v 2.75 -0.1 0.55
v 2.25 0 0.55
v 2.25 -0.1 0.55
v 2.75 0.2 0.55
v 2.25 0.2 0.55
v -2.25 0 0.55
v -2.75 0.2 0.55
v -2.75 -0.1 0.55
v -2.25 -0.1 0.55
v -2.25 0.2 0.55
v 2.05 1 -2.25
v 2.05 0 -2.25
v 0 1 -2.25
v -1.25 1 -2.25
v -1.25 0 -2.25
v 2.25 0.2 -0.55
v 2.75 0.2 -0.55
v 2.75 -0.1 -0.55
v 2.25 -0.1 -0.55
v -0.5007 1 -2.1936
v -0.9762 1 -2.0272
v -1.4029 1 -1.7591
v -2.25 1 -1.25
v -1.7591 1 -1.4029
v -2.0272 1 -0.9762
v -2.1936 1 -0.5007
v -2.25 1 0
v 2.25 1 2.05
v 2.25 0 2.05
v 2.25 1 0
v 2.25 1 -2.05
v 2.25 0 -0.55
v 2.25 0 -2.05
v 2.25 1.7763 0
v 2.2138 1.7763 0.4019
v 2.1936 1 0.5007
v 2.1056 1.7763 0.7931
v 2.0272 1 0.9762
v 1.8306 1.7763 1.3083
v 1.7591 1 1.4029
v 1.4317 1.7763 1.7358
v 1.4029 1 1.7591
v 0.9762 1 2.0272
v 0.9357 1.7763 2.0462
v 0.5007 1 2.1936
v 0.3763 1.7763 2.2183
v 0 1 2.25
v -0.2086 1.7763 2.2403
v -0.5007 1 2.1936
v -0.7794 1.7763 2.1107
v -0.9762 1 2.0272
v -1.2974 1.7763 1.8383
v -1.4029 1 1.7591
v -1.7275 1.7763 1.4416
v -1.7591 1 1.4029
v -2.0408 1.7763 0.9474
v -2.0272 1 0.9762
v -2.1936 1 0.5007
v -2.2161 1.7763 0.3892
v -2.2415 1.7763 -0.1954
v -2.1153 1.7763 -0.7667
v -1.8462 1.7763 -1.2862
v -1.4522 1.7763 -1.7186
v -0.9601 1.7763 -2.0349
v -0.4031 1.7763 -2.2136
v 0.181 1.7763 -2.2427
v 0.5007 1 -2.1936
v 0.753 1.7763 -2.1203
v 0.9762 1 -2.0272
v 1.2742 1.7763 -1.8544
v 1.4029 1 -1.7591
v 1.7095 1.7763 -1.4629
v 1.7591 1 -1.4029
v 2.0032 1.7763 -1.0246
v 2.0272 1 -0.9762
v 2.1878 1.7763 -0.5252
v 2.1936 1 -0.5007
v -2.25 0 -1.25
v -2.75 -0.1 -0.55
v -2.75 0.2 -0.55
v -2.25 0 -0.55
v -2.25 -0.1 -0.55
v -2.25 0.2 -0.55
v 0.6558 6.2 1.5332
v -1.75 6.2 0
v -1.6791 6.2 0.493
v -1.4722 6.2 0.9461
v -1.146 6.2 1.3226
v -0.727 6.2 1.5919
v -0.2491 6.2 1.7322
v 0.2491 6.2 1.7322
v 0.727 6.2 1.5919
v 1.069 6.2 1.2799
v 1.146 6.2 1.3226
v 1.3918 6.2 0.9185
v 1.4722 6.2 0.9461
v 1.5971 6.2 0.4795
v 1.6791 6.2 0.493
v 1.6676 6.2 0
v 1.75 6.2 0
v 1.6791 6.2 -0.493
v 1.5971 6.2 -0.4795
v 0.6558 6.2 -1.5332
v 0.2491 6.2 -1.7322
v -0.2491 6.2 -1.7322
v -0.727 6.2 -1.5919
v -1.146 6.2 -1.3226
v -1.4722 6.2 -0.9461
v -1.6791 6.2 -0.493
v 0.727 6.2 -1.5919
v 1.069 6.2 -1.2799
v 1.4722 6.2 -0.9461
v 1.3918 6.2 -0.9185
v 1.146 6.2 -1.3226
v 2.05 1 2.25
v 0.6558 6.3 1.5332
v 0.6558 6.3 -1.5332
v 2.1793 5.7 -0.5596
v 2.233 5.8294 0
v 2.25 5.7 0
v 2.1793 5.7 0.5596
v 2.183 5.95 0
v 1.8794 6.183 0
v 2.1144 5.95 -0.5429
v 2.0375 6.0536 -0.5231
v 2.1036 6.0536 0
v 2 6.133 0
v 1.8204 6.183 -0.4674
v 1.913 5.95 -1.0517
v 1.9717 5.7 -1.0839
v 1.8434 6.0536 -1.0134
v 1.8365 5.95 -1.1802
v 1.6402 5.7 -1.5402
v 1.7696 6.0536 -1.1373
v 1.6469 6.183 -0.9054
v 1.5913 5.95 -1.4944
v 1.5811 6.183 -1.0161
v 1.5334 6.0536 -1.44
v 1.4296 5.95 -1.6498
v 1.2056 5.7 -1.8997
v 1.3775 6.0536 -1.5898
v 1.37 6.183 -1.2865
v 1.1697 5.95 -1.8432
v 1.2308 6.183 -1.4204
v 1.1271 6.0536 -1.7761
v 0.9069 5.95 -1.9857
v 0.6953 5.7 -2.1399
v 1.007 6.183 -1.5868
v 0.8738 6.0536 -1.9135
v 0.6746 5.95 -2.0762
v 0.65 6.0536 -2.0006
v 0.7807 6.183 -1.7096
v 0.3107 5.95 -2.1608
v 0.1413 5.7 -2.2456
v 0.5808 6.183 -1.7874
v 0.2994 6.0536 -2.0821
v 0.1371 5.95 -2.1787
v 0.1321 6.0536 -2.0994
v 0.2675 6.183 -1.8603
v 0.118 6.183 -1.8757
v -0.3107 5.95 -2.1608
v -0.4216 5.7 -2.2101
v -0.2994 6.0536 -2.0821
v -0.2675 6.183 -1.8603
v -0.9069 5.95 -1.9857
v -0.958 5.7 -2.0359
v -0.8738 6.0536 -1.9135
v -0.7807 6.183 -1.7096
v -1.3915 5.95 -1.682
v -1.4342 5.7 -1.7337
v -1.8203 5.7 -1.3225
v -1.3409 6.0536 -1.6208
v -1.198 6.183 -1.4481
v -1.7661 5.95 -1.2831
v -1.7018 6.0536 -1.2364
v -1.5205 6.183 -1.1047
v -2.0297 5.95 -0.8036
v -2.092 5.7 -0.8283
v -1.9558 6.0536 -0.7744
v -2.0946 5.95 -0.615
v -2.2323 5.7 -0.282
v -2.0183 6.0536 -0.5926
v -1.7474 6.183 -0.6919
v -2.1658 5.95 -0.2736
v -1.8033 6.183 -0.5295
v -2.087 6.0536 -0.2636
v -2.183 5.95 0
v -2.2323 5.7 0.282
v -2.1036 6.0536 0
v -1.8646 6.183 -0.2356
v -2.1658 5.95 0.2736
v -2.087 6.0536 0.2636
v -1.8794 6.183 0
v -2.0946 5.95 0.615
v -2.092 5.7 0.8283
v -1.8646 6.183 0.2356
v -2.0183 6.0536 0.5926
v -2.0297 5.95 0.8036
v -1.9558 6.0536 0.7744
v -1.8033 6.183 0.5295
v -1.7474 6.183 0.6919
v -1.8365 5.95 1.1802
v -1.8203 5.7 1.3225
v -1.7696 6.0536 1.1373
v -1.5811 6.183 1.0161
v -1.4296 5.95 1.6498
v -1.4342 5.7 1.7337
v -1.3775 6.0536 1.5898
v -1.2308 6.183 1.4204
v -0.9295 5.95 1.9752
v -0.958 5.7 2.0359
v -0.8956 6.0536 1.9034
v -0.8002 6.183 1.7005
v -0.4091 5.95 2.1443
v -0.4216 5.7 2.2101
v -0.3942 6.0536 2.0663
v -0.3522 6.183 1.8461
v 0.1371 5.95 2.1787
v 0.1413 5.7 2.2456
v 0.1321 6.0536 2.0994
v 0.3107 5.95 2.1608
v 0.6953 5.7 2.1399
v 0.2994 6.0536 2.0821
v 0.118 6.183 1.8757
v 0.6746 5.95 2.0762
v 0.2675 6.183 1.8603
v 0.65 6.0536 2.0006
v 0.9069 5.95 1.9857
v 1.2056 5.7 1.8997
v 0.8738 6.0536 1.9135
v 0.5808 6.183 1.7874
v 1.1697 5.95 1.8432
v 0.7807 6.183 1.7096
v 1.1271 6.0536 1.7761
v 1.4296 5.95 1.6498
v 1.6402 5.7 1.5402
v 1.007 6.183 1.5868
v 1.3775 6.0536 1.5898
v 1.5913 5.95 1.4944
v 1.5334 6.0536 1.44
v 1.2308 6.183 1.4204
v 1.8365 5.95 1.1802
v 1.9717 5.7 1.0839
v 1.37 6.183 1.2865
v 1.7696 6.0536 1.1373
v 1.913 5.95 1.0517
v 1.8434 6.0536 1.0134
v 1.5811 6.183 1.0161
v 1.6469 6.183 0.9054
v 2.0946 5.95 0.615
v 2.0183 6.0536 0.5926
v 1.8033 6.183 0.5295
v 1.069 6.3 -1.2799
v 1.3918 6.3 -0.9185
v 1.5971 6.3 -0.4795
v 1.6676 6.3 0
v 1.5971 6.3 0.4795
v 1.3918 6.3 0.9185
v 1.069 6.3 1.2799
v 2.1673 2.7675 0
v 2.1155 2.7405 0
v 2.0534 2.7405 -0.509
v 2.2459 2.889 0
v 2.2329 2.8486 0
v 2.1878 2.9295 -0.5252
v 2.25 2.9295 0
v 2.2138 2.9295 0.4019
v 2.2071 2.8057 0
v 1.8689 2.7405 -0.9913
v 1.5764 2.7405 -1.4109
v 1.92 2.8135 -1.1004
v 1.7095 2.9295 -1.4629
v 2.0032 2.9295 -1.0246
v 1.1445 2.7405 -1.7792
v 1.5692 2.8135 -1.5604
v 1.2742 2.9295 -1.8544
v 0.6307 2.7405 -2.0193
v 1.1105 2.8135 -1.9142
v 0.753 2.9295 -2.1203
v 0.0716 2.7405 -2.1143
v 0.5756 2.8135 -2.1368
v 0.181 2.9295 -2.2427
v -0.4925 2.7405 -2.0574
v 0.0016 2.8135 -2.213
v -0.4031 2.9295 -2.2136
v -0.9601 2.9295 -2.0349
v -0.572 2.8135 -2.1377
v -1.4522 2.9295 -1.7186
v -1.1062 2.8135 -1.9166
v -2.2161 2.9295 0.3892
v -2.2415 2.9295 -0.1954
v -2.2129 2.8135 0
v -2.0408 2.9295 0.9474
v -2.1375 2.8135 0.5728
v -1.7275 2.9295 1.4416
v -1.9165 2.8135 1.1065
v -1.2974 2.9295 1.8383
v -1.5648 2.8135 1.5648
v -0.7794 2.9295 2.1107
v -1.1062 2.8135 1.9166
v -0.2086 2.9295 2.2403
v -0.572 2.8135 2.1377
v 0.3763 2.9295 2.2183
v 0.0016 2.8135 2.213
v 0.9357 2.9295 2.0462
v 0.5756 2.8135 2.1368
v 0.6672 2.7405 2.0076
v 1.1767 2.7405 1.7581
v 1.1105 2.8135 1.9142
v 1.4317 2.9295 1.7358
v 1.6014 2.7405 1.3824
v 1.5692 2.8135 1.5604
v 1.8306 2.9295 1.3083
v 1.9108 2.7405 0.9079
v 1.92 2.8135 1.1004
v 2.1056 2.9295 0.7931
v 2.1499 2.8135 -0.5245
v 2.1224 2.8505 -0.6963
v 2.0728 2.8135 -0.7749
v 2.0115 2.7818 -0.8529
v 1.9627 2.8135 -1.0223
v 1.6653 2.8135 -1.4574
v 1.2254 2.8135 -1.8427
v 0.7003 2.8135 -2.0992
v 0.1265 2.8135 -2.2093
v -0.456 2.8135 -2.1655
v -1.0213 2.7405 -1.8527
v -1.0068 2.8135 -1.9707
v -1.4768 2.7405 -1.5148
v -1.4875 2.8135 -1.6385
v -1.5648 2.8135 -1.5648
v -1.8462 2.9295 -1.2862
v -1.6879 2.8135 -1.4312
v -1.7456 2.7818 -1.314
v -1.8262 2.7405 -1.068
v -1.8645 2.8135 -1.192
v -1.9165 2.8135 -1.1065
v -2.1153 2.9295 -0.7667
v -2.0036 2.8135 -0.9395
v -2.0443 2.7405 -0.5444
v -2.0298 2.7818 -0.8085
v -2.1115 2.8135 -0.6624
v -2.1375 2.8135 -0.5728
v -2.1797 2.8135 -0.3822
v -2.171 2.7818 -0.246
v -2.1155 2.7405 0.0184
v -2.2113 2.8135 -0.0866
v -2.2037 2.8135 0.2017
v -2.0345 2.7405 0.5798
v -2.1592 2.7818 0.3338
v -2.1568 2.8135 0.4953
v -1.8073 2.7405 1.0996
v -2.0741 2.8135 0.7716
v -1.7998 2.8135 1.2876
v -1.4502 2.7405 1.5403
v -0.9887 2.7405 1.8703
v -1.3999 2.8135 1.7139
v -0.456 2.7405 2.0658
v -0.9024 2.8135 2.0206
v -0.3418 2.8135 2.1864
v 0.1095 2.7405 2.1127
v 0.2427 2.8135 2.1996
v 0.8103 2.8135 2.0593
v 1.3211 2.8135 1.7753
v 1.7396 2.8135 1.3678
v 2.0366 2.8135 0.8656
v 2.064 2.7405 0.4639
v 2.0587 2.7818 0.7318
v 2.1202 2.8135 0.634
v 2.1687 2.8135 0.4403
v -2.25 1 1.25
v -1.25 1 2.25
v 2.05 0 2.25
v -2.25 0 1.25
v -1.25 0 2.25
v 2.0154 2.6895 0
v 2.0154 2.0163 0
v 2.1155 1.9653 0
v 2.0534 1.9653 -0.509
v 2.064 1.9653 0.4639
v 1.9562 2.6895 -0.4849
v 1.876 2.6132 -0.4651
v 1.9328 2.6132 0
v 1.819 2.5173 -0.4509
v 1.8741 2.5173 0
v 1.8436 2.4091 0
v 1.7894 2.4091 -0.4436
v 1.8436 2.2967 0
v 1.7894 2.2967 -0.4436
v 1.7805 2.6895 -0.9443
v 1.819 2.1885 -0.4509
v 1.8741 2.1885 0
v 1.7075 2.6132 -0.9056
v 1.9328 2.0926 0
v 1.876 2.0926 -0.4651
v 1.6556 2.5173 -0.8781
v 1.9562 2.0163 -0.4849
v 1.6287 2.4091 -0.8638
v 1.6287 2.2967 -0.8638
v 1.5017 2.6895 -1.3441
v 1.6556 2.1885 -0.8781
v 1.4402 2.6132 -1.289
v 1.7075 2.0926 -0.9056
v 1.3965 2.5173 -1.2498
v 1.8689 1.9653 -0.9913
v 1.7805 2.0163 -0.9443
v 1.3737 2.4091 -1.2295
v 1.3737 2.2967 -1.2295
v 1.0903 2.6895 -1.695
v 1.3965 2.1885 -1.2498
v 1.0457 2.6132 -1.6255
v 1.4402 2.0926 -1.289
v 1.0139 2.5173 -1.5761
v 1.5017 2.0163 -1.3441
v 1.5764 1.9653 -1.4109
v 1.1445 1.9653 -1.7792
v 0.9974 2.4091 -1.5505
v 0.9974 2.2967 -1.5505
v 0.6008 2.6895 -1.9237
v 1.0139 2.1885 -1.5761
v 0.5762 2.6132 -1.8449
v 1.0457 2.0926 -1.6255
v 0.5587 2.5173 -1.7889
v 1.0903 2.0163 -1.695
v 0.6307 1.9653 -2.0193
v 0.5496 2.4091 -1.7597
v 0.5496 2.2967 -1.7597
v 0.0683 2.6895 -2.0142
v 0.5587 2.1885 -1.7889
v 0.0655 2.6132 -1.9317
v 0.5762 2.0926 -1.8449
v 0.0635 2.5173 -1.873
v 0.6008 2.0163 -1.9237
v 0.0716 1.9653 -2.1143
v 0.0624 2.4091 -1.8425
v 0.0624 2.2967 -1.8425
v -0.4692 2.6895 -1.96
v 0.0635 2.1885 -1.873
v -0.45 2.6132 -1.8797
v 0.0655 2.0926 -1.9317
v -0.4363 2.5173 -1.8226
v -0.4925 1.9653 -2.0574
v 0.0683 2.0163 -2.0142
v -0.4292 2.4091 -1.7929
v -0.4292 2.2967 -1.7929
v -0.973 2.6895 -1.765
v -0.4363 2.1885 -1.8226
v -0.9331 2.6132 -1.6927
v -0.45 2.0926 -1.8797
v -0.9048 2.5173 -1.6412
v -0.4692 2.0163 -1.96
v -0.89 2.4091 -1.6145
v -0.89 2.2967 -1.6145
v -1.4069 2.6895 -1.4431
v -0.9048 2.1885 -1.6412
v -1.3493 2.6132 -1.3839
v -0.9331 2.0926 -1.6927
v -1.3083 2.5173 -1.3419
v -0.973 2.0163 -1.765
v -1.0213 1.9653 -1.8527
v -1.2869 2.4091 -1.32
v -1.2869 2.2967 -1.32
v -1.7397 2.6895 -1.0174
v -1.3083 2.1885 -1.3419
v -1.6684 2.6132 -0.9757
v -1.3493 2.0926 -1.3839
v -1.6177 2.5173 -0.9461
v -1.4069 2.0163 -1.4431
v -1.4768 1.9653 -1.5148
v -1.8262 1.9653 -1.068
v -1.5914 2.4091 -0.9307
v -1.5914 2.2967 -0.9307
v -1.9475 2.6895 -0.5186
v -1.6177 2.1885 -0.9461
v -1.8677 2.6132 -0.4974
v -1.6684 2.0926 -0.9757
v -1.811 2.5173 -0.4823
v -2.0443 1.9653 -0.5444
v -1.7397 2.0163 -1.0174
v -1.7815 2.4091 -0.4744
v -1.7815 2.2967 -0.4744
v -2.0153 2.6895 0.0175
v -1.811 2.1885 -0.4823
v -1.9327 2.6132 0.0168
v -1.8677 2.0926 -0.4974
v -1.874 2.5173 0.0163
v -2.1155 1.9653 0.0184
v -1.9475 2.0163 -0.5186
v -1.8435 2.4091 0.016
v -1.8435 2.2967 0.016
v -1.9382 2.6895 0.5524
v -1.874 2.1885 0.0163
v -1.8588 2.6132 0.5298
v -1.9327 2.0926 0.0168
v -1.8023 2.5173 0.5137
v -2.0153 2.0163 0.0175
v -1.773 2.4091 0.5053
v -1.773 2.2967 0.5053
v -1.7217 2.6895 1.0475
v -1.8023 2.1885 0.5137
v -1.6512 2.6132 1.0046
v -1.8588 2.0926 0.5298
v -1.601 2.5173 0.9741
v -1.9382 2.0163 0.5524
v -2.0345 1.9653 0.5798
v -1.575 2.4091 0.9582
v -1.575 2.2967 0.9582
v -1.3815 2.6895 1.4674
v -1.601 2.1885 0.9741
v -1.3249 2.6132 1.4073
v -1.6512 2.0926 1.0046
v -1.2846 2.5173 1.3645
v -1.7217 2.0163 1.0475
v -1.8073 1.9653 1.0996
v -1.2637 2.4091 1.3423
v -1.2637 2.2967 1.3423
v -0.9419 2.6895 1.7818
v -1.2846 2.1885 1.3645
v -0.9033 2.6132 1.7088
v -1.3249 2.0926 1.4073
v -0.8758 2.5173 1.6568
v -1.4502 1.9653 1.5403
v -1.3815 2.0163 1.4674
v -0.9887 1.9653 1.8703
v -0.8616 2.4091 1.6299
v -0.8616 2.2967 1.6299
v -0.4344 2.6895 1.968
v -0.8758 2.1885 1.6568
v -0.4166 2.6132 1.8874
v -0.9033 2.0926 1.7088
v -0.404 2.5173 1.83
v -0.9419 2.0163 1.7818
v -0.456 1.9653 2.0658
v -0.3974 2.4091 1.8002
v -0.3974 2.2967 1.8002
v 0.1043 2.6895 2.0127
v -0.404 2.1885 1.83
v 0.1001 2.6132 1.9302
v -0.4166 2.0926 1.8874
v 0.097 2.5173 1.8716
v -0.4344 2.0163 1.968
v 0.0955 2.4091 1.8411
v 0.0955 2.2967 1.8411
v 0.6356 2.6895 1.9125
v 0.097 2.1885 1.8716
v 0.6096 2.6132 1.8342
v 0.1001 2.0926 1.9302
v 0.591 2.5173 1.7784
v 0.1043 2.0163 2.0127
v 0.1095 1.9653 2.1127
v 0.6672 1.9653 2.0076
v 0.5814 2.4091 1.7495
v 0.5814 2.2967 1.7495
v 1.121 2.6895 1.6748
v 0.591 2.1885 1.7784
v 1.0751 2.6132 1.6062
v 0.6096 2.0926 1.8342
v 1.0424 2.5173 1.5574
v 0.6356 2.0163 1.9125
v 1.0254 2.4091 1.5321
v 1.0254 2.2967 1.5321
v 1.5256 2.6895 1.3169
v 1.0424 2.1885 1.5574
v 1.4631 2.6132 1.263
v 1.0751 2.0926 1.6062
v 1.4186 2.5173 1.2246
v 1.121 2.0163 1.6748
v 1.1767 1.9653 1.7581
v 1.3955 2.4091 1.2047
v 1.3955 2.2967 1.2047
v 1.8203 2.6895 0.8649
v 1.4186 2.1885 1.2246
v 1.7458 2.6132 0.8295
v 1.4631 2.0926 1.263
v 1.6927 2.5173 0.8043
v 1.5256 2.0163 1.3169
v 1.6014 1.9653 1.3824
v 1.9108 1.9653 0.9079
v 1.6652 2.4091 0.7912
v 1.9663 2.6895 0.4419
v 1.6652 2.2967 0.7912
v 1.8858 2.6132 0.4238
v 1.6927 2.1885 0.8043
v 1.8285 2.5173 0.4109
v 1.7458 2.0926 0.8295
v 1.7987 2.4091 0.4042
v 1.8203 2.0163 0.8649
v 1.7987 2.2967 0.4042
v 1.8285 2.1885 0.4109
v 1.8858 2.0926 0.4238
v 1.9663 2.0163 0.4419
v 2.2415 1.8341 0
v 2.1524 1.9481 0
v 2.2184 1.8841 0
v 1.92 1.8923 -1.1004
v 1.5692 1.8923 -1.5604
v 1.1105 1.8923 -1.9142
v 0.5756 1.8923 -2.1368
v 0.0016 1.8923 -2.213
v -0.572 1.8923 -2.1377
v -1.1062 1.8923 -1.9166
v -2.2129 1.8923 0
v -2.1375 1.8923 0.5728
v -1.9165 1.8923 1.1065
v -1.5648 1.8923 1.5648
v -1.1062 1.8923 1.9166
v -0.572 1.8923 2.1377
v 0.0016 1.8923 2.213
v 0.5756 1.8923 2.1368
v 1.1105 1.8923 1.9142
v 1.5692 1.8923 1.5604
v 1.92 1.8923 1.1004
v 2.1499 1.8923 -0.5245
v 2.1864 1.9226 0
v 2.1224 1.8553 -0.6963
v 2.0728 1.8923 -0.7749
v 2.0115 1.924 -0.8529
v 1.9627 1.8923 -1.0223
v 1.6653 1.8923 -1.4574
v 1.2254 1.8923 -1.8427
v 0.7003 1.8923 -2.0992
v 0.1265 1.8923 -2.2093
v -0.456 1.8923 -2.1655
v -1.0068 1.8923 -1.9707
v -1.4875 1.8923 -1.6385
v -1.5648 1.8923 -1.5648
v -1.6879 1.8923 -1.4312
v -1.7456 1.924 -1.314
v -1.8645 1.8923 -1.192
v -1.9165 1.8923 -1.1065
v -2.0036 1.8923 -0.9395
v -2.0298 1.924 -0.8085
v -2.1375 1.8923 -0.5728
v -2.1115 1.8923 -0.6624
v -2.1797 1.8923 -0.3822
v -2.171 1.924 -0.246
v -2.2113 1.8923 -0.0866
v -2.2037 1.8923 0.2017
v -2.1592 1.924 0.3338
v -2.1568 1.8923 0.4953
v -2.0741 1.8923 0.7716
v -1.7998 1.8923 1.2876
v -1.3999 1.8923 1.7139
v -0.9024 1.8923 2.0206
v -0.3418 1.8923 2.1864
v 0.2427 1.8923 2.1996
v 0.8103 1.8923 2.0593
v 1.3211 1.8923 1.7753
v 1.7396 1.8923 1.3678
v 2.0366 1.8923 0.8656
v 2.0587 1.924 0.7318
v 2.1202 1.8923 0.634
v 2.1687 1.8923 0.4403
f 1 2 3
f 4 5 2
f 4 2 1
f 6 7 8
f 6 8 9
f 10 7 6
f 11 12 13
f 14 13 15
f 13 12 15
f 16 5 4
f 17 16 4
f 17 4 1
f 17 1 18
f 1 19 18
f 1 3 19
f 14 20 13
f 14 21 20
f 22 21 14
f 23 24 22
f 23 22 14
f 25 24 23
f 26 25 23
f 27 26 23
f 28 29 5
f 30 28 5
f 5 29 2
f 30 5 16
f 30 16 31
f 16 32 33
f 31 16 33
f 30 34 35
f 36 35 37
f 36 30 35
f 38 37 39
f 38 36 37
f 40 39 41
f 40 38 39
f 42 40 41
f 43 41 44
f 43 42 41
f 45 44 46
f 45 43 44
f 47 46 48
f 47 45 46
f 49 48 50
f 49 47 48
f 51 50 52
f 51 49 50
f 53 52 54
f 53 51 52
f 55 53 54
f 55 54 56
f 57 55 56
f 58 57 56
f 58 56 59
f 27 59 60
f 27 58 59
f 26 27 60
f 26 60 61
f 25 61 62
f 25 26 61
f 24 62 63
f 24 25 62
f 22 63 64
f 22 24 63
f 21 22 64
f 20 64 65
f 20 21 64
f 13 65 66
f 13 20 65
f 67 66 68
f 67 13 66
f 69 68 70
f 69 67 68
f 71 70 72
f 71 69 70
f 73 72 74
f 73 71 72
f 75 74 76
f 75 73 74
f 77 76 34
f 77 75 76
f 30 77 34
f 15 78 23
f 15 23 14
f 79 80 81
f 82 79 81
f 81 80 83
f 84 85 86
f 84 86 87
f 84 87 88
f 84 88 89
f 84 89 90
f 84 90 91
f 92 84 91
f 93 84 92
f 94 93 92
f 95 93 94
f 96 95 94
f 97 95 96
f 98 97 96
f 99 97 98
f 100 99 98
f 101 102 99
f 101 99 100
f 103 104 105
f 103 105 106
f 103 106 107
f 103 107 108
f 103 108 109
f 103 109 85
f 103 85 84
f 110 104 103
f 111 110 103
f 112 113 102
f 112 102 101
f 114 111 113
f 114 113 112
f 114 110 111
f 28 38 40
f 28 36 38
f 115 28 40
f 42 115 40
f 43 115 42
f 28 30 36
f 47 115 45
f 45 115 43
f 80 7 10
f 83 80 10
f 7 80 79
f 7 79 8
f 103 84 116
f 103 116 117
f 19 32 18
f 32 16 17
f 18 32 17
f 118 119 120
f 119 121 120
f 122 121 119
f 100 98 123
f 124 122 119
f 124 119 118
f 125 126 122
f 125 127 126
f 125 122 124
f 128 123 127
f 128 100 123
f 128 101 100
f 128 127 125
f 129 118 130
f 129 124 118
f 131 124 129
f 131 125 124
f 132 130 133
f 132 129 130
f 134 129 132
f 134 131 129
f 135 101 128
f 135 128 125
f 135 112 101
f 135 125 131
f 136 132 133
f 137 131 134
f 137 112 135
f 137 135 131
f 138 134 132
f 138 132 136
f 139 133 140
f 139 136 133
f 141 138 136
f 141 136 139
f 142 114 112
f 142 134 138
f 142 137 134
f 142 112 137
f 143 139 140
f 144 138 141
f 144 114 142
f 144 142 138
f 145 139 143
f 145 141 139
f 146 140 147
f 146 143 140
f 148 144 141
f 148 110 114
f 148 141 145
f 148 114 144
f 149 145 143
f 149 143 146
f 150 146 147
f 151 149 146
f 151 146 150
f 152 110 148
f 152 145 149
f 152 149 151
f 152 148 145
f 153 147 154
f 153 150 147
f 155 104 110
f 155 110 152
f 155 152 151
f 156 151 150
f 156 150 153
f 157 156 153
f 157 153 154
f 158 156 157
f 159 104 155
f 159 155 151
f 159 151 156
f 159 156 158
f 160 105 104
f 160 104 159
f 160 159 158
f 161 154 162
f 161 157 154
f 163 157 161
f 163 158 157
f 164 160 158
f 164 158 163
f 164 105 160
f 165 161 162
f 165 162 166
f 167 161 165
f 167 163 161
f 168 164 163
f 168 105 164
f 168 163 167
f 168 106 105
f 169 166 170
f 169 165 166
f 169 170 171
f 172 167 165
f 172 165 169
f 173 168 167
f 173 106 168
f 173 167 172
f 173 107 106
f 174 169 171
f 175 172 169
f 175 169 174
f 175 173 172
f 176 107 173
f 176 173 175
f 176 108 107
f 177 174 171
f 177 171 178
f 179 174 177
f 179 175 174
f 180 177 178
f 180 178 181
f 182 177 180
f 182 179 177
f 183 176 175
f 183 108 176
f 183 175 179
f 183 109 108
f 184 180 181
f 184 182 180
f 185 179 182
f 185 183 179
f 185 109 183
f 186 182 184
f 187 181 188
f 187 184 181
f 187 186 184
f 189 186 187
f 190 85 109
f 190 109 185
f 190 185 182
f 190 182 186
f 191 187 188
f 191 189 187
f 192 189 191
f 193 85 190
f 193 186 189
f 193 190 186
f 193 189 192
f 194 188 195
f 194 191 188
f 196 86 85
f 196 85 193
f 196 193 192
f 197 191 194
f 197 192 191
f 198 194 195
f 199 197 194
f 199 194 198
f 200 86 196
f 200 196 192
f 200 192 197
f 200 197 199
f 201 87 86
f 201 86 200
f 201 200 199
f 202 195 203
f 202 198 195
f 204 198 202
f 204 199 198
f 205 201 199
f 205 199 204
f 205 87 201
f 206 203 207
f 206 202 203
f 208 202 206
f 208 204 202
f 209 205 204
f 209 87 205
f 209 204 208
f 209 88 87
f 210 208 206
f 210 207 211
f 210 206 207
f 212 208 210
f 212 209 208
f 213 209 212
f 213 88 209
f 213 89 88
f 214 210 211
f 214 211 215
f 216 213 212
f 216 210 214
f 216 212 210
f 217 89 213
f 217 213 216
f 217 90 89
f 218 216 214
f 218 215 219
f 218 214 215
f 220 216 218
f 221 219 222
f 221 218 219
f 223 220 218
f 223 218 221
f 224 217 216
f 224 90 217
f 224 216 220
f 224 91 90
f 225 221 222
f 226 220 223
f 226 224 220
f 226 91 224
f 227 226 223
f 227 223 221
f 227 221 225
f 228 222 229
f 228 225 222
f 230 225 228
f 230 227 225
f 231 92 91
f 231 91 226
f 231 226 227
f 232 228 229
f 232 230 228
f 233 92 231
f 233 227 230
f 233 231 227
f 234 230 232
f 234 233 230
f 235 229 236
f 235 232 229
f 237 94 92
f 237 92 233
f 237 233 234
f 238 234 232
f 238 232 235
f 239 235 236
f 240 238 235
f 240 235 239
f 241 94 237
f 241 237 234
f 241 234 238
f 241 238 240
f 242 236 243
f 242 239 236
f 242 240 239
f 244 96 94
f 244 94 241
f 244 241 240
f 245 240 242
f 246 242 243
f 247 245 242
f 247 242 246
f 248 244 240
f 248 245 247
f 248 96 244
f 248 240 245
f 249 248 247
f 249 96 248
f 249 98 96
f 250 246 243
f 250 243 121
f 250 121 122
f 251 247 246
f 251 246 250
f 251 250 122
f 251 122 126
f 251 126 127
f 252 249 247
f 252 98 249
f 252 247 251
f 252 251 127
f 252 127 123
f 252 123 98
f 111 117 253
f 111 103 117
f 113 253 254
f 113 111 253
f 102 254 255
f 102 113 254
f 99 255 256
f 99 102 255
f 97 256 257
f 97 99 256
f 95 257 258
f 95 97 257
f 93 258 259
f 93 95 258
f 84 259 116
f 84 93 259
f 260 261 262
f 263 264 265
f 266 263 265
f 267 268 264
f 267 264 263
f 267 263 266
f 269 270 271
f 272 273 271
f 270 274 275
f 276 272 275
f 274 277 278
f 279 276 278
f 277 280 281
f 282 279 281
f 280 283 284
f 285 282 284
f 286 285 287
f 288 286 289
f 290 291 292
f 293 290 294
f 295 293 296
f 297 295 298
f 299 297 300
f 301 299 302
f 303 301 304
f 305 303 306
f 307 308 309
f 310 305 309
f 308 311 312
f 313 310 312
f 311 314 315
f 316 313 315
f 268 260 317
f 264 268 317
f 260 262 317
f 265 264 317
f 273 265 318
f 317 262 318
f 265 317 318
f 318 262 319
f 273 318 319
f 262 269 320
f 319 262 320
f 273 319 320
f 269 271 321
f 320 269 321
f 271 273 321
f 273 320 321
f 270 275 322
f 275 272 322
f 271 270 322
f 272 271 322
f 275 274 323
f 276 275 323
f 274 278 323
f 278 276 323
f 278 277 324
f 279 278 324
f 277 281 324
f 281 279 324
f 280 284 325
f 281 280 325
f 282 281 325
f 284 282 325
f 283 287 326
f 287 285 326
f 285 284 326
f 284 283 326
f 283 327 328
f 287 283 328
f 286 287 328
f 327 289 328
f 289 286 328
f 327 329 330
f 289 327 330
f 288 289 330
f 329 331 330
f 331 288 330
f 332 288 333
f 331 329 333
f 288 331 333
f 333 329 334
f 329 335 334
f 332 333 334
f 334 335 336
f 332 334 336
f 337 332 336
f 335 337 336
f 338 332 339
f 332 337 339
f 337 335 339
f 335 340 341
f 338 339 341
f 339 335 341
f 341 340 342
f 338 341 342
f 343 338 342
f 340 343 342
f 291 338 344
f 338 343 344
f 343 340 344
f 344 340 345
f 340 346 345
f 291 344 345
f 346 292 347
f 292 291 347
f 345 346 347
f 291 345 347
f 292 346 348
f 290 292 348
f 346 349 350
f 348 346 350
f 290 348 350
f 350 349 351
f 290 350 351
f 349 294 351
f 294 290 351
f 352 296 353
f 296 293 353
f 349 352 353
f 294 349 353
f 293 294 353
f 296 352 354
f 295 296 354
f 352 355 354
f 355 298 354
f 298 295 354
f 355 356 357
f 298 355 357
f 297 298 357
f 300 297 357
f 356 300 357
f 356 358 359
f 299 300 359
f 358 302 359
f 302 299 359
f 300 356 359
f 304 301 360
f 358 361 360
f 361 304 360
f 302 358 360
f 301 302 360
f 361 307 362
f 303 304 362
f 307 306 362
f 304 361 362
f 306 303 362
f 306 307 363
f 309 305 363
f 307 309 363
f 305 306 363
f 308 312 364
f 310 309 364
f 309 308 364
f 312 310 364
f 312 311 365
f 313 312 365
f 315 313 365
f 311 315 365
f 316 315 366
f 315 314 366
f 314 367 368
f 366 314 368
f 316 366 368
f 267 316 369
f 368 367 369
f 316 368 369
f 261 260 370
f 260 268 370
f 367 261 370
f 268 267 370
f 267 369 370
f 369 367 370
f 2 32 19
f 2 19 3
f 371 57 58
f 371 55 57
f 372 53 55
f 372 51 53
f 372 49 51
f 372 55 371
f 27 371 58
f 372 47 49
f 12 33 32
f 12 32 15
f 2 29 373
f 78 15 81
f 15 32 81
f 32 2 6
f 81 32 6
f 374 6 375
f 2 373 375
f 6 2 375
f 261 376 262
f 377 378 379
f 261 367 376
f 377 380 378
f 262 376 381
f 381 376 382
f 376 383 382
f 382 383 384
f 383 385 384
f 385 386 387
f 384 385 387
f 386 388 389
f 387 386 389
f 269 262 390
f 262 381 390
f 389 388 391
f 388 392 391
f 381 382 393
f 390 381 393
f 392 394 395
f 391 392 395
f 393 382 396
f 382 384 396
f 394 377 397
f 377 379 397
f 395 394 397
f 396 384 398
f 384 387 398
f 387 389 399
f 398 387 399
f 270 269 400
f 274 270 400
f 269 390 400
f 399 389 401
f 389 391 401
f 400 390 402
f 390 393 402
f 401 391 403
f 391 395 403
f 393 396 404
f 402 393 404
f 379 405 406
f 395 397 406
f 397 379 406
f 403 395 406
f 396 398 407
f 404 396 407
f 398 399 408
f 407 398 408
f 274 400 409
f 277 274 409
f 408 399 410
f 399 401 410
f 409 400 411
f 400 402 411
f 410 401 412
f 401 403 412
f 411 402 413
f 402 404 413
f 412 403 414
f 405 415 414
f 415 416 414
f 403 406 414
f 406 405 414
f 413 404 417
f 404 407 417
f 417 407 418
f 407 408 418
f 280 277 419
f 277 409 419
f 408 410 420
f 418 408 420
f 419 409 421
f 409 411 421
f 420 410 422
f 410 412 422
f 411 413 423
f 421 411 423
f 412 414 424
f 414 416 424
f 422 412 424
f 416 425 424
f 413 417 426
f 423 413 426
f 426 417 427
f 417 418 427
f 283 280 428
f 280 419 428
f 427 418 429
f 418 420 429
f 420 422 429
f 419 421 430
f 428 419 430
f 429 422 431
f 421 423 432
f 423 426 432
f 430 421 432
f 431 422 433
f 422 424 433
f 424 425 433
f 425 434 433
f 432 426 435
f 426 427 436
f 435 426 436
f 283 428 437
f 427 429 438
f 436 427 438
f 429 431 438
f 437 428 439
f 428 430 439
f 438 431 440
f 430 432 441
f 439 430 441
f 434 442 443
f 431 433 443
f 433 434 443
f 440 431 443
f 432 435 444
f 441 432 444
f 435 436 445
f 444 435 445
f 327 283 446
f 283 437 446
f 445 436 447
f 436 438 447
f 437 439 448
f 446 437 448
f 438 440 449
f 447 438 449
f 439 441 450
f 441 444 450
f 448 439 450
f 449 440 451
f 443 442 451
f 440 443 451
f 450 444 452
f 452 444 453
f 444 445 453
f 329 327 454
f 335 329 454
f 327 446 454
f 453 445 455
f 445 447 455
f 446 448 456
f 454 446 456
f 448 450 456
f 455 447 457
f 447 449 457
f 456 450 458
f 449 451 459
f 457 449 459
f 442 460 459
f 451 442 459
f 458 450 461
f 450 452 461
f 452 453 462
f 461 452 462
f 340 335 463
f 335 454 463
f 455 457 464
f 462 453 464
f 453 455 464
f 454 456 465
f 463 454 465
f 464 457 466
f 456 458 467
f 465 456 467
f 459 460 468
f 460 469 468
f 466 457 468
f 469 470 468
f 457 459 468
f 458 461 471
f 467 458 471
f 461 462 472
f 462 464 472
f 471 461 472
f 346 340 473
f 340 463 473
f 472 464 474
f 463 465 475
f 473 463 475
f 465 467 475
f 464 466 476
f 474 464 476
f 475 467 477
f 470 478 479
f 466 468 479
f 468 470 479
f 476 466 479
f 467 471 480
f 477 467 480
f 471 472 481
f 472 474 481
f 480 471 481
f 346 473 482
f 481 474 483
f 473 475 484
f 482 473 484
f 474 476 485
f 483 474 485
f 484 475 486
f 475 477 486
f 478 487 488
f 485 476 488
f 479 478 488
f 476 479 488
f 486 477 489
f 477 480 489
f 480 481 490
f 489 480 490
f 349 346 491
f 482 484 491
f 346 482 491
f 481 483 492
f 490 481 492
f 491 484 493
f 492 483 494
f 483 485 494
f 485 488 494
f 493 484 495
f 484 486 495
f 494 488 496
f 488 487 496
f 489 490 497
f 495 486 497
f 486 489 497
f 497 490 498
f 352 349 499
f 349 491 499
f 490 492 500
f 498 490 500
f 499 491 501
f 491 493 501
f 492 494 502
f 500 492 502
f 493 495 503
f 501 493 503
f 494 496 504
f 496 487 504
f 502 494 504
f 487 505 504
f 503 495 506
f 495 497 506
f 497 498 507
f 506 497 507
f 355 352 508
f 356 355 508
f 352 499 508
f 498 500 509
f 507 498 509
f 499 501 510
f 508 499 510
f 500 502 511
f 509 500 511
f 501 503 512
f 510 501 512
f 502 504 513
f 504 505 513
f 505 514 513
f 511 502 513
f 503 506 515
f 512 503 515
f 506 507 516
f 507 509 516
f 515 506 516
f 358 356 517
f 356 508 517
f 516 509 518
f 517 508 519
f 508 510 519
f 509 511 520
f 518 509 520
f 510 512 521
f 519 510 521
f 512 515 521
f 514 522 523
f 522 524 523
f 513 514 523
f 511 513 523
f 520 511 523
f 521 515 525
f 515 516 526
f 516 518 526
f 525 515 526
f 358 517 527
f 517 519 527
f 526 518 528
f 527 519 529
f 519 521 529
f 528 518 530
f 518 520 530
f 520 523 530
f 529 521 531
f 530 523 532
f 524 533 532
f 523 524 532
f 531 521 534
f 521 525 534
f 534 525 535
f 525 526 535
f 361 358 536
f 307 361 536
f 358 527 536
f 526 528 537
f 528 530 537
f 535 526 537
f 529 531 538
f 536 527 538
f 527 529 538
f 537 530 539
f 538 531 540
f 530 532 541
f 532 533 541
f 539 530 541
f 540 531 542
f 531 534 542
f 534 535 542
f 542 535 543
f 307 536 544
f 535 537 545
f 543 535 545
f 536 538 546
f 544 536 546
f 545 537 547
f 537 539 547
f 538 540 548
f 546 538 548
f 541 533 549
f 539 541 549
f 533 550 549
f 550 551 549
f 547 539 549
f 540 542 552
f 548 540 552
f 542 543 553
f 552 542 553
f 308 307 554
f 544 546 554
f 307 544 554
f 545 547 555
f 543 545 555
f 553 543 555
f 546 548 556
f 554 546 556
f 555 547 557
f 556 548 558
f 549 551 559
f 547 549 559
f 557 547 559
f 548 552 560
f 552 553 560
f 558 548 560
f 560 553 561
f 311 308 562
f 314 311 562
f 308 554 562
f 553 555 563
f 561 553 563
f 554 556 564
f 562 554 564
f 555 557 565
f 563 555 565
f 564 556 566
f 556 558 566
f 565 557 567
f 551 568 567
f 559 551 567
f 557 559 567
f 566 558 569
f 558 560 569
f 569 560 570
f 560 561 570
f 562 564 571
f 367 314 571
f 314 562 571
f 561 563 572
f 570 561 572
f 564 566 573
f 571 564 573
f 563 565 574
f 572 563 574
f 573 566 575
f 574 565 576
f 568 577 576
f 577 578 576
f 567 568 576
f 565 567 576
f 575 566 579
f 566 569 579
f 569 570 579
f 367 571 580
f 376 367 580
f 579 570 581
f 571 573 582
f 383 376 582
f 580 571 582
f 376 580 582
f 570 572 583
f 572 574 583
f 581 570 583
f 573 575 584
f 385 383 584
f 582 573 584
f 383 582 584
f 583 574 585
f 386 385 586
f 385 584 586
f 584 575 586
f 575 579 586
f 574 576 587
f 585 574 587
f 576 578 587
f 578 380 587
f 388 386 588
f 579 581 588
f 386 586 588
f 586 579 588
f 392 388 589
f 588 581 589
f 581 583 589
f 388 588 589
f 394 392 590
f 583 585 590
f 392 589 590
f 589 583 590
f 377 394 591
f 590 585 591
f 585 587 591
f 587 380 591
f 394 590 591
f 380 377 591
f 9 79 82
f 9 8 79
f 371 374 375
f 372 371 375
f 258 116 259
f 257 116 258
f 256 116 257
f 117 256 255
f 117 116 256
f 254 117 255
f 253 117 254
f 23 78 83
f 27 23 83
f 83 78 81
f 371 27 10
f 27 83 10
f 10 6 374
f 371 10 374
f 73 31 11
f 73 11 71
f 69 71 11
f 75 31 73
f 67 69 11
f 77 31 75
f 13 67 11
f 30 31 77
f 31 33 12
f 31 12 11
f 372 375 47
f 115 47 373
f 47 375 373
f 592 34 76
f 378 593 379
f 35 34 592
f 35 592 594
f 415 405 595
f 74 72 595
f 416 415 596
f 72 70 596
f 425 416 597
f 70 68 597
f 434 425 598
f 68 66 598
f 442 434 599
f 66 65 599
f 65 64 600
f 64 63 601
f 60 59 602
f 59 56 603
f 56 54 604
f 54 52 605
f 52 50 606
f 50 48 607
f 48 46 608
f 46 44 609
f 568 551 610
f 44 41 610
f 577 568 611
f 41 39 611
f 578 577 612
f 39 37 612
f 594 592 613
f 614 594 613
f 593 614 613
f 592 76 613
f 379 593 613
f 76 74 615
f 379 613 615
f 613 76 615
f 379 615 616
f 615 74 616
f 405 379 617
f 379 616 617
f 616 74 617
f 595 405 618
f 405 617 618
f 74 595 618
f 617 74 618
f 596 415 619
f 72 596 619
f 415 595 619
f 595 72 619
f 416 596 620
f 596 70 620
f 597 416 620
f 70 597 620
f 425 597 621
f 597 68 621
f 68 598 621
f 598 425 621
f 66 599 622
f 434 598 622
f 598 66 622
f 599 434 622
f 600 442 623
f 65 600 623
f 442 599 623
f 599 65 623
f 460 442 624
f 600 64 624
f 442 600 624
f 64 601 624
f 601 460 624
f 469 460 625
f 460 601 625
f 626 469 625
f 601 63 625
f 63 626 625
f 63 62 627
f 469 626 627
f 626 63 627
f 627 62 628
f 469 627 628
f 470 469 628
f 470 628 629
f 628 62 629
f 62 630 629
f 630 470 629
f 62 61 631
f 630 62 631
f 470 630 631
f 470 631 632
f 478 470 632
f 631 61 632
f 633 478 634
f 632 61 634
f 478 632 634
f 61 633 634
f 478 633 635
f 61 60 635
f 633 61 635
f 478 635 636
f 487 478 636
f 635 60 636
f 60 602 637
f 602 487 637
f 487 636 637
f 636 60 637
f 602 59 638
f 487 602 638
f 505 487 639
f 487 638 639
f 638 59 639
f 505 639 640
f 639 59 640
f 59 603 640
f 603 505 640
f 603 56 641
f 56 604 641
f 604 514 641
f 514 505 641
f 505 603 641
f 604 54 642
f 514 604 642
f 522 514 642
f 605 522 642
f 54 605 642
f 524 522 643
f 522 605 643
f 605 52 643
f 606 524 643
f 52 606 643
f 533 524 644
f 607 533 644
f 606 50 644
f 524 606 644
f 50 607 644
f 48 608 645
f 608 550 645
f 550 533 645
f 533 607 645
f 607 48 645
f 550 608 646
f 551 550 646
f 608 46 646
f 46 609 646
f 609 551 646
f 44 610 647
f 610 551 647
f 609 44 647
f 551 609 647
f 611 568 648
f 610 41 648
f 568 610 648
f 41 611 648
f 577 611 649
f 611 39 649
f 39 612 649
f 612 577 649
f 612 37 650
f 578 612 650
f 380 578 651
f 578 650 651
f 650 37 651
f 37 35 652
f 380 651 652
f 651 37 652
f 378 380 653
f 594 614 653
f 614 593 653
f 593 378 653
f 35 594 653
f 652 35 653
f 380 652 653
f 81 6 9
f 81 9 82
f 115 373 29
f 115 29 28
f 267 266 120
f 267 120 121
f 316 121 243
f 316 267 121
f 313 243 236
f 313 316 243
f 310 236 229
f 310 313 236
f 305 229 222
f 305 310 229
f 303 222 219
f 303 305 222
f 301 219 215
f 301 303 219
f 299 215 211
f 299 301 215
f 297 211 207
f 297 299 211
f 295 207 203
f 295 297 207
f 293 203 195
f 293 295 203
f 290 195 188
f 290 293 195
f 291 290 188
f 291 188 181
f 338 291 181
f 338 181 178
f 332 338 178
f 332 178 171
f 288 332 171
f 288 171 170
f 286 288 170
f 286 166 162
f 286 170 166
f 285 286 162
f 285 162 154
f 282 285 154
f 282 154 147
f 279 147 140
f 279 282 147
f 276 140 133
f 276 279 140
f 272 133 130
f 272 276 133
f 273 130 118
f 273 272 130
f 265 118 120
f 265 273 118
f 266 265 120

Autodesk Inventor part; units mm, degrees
ref_plane "YZ Plane" through (0, 0, 0) normal (1, 0, 0) x (0, 1, 0)
ref_plane "XZ Plane" through (0, 0, 0) normal (0, 1, 0) x (-1, 0, 0)
ref_plane "XY Plane" through (0, 0, 0) normal (0, 0, 1) x (1, 0, 0)
sketch "Sketch1" plane through (0, 0, 0) normal (0, 1, 0) x (-1, 0, 0)
  line L0 (2.25, 2.25) -> (-2.25, 2.25)
  line L1 (-2.25, 2.25) -> (-2.25, -2.25)
  line L2 (-2.25, -2.25) -> (2.25, -2.25)
  line L3 (2.25, -2.25) -> (2.25, 2.25)
  line L4 (2.25, 1.25) -> (1.25, 2.25)
  line L5 (2.25, -1.25) -> (1.25, -2.25)
  point P0 (0, 0)
  dimension "d0" = 4.5
  dimension "d1" = 4.5
  dimension "d2" = 2.25
  dimension "d3" = 2.25
  dimension "d4" = 45
  dimension "d5" = 45
  dimension "d6" = 1
  dimension "d7" = 1
extrude "Extrusion1" add sketch "Sketch1" along normal blind 1 contours L4 L3 L5 L2 L1 L0
chamfer "Chamfer1" distance 0.2 angle 45 2 edges at (2.25, 0.5, 2.25) (2.25, 0.5, -2.25)
sketch "Sketch2" plane through (0, 1, 0) normal (0, 1, 0) x (1, 0, 0)
  circle A0 centre (0, 0) radius 2.25
  dimension "d13" = 4.5
extrude "Extrusion2" add sketch "Sketch2" along normal blind 5.2
sketch "Sketch3" plane through (0, 0, 0) normal (0, -1, 0) x (1, 0, 0)
  line L0 (-2.25, 0.55) -> (-2.25, -0.55)
  line L1 (-2.75, -0.55) -> (-2.75, 0.55)
  line L2 (-2.75, 0.55) -> (-2.25, 0.55)
  line L3 (-2.75, -0.55) -> (-2.25, -0.55)
  point P0 (0, 0)
  dimension "d16" = 1.1
  dimension "d18" = 2.25
  dimension "d33" = 2.75
extrude "Extrusion3" add sketch "Sketch3" along normal blind 0.1 and the other way blind 0.2
mirror "Mirror1" about plane through (0, 0, 0) normal (1, 0, 0) of "Extrusion3"
fillet "Fillet1" radius 0.5 1 edges at (-2.25, 6.2, 0)
sketch "Sketch4" plane through (0, 6.2, 0) normal (0, 1, 0) x (1, 0, 0)
  circle A0 centre (0, 0) radius 6.25
  circle A1 centre (0, 0) radius 2.25 projected
  line L0 (3.2451, -4.6893) -> (3.2427, 4.6909)
  arc A2 (3.2451, -4.6893) -> (3.2427, 4.6909) centre (0, 0) ccw
  arc A3 (0.6558, -1.5332) -> (0.6558, 1.5332) centre (0, 0) ccw
  line L1 (0.6558, -1.5332) -> (0.6558, 1.5332)
extrude "Extrusion5" add sketch "Sketch4" along normal blind 0.1 contours L1 A3
sketch "Sketch5" plane through (0, 0, 0) normal (0, 0, 1) x (1, 0, 0)
  line L0 (2.25, 1) -> (2.25, 5.7) projected
  line L1 (0, -1.3032) -> (0, 7.8193) projected
  circle A0 centre (2.25, 2.3529) radius 0.4103
  point P0 (0, 0)
revolve "Revolution1" cut sketch "Sketch5" angle 360 about axis through (0, -10, 0) along (0, 1, 0)
fillet "Fillet4" radius 0.2 2 edges at (-2.25, 1.9426, 0) (-2.25, 2.7632, 0)
properties part number "SMTElectro4x4x6_5"
